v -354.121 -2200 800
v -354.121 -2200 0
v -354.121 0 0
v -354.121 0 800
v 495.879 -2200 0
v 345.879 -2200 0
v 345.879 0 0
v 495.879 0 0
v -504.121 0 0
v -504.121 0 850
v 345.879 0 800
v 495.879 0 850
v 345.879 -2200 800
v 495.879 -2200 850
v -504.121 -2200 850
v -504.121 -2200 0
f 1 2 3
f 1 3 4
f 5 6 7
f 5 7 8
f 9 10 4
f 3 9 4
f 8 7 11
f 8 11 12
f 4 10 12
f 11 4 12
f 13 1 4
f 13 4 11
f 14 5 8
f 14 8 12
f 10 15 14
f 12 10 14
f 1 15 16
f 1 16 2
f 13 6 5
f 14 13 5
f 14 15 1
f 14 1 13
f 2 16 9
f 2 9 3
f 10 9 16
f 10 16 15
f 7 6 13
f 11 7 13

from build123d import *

# Parameters (mm, degrees)
F0_W     = 1000
F0_H     = 50
F1_DEPTH = 2200
F2_W     = 150
F2_H     = 800
F3_DEPTH = 2200


with BuildPart() as f1:
    # F0 (on Front) → F1 (new body)
    with BuildSketch(Plane.XZ):
        with Locations((-4.120639, 825)):
            Rectangle(F0_W, F0_H)
    extrude(amount=F1_DEPTH)

    # F2 (on face) → F3 (join, through all)
    with BuildSketch(Plane.XZ.offset(2200)):
        with Locations((420.879361, 400)):
            Rectangle(F2_W, F2_H)
        with Locations((-429.120639, 400)):
            Rectangle(F2_W, F2_H)
    extrude(amount=-F3_DEPTH)


solid = f1.part
